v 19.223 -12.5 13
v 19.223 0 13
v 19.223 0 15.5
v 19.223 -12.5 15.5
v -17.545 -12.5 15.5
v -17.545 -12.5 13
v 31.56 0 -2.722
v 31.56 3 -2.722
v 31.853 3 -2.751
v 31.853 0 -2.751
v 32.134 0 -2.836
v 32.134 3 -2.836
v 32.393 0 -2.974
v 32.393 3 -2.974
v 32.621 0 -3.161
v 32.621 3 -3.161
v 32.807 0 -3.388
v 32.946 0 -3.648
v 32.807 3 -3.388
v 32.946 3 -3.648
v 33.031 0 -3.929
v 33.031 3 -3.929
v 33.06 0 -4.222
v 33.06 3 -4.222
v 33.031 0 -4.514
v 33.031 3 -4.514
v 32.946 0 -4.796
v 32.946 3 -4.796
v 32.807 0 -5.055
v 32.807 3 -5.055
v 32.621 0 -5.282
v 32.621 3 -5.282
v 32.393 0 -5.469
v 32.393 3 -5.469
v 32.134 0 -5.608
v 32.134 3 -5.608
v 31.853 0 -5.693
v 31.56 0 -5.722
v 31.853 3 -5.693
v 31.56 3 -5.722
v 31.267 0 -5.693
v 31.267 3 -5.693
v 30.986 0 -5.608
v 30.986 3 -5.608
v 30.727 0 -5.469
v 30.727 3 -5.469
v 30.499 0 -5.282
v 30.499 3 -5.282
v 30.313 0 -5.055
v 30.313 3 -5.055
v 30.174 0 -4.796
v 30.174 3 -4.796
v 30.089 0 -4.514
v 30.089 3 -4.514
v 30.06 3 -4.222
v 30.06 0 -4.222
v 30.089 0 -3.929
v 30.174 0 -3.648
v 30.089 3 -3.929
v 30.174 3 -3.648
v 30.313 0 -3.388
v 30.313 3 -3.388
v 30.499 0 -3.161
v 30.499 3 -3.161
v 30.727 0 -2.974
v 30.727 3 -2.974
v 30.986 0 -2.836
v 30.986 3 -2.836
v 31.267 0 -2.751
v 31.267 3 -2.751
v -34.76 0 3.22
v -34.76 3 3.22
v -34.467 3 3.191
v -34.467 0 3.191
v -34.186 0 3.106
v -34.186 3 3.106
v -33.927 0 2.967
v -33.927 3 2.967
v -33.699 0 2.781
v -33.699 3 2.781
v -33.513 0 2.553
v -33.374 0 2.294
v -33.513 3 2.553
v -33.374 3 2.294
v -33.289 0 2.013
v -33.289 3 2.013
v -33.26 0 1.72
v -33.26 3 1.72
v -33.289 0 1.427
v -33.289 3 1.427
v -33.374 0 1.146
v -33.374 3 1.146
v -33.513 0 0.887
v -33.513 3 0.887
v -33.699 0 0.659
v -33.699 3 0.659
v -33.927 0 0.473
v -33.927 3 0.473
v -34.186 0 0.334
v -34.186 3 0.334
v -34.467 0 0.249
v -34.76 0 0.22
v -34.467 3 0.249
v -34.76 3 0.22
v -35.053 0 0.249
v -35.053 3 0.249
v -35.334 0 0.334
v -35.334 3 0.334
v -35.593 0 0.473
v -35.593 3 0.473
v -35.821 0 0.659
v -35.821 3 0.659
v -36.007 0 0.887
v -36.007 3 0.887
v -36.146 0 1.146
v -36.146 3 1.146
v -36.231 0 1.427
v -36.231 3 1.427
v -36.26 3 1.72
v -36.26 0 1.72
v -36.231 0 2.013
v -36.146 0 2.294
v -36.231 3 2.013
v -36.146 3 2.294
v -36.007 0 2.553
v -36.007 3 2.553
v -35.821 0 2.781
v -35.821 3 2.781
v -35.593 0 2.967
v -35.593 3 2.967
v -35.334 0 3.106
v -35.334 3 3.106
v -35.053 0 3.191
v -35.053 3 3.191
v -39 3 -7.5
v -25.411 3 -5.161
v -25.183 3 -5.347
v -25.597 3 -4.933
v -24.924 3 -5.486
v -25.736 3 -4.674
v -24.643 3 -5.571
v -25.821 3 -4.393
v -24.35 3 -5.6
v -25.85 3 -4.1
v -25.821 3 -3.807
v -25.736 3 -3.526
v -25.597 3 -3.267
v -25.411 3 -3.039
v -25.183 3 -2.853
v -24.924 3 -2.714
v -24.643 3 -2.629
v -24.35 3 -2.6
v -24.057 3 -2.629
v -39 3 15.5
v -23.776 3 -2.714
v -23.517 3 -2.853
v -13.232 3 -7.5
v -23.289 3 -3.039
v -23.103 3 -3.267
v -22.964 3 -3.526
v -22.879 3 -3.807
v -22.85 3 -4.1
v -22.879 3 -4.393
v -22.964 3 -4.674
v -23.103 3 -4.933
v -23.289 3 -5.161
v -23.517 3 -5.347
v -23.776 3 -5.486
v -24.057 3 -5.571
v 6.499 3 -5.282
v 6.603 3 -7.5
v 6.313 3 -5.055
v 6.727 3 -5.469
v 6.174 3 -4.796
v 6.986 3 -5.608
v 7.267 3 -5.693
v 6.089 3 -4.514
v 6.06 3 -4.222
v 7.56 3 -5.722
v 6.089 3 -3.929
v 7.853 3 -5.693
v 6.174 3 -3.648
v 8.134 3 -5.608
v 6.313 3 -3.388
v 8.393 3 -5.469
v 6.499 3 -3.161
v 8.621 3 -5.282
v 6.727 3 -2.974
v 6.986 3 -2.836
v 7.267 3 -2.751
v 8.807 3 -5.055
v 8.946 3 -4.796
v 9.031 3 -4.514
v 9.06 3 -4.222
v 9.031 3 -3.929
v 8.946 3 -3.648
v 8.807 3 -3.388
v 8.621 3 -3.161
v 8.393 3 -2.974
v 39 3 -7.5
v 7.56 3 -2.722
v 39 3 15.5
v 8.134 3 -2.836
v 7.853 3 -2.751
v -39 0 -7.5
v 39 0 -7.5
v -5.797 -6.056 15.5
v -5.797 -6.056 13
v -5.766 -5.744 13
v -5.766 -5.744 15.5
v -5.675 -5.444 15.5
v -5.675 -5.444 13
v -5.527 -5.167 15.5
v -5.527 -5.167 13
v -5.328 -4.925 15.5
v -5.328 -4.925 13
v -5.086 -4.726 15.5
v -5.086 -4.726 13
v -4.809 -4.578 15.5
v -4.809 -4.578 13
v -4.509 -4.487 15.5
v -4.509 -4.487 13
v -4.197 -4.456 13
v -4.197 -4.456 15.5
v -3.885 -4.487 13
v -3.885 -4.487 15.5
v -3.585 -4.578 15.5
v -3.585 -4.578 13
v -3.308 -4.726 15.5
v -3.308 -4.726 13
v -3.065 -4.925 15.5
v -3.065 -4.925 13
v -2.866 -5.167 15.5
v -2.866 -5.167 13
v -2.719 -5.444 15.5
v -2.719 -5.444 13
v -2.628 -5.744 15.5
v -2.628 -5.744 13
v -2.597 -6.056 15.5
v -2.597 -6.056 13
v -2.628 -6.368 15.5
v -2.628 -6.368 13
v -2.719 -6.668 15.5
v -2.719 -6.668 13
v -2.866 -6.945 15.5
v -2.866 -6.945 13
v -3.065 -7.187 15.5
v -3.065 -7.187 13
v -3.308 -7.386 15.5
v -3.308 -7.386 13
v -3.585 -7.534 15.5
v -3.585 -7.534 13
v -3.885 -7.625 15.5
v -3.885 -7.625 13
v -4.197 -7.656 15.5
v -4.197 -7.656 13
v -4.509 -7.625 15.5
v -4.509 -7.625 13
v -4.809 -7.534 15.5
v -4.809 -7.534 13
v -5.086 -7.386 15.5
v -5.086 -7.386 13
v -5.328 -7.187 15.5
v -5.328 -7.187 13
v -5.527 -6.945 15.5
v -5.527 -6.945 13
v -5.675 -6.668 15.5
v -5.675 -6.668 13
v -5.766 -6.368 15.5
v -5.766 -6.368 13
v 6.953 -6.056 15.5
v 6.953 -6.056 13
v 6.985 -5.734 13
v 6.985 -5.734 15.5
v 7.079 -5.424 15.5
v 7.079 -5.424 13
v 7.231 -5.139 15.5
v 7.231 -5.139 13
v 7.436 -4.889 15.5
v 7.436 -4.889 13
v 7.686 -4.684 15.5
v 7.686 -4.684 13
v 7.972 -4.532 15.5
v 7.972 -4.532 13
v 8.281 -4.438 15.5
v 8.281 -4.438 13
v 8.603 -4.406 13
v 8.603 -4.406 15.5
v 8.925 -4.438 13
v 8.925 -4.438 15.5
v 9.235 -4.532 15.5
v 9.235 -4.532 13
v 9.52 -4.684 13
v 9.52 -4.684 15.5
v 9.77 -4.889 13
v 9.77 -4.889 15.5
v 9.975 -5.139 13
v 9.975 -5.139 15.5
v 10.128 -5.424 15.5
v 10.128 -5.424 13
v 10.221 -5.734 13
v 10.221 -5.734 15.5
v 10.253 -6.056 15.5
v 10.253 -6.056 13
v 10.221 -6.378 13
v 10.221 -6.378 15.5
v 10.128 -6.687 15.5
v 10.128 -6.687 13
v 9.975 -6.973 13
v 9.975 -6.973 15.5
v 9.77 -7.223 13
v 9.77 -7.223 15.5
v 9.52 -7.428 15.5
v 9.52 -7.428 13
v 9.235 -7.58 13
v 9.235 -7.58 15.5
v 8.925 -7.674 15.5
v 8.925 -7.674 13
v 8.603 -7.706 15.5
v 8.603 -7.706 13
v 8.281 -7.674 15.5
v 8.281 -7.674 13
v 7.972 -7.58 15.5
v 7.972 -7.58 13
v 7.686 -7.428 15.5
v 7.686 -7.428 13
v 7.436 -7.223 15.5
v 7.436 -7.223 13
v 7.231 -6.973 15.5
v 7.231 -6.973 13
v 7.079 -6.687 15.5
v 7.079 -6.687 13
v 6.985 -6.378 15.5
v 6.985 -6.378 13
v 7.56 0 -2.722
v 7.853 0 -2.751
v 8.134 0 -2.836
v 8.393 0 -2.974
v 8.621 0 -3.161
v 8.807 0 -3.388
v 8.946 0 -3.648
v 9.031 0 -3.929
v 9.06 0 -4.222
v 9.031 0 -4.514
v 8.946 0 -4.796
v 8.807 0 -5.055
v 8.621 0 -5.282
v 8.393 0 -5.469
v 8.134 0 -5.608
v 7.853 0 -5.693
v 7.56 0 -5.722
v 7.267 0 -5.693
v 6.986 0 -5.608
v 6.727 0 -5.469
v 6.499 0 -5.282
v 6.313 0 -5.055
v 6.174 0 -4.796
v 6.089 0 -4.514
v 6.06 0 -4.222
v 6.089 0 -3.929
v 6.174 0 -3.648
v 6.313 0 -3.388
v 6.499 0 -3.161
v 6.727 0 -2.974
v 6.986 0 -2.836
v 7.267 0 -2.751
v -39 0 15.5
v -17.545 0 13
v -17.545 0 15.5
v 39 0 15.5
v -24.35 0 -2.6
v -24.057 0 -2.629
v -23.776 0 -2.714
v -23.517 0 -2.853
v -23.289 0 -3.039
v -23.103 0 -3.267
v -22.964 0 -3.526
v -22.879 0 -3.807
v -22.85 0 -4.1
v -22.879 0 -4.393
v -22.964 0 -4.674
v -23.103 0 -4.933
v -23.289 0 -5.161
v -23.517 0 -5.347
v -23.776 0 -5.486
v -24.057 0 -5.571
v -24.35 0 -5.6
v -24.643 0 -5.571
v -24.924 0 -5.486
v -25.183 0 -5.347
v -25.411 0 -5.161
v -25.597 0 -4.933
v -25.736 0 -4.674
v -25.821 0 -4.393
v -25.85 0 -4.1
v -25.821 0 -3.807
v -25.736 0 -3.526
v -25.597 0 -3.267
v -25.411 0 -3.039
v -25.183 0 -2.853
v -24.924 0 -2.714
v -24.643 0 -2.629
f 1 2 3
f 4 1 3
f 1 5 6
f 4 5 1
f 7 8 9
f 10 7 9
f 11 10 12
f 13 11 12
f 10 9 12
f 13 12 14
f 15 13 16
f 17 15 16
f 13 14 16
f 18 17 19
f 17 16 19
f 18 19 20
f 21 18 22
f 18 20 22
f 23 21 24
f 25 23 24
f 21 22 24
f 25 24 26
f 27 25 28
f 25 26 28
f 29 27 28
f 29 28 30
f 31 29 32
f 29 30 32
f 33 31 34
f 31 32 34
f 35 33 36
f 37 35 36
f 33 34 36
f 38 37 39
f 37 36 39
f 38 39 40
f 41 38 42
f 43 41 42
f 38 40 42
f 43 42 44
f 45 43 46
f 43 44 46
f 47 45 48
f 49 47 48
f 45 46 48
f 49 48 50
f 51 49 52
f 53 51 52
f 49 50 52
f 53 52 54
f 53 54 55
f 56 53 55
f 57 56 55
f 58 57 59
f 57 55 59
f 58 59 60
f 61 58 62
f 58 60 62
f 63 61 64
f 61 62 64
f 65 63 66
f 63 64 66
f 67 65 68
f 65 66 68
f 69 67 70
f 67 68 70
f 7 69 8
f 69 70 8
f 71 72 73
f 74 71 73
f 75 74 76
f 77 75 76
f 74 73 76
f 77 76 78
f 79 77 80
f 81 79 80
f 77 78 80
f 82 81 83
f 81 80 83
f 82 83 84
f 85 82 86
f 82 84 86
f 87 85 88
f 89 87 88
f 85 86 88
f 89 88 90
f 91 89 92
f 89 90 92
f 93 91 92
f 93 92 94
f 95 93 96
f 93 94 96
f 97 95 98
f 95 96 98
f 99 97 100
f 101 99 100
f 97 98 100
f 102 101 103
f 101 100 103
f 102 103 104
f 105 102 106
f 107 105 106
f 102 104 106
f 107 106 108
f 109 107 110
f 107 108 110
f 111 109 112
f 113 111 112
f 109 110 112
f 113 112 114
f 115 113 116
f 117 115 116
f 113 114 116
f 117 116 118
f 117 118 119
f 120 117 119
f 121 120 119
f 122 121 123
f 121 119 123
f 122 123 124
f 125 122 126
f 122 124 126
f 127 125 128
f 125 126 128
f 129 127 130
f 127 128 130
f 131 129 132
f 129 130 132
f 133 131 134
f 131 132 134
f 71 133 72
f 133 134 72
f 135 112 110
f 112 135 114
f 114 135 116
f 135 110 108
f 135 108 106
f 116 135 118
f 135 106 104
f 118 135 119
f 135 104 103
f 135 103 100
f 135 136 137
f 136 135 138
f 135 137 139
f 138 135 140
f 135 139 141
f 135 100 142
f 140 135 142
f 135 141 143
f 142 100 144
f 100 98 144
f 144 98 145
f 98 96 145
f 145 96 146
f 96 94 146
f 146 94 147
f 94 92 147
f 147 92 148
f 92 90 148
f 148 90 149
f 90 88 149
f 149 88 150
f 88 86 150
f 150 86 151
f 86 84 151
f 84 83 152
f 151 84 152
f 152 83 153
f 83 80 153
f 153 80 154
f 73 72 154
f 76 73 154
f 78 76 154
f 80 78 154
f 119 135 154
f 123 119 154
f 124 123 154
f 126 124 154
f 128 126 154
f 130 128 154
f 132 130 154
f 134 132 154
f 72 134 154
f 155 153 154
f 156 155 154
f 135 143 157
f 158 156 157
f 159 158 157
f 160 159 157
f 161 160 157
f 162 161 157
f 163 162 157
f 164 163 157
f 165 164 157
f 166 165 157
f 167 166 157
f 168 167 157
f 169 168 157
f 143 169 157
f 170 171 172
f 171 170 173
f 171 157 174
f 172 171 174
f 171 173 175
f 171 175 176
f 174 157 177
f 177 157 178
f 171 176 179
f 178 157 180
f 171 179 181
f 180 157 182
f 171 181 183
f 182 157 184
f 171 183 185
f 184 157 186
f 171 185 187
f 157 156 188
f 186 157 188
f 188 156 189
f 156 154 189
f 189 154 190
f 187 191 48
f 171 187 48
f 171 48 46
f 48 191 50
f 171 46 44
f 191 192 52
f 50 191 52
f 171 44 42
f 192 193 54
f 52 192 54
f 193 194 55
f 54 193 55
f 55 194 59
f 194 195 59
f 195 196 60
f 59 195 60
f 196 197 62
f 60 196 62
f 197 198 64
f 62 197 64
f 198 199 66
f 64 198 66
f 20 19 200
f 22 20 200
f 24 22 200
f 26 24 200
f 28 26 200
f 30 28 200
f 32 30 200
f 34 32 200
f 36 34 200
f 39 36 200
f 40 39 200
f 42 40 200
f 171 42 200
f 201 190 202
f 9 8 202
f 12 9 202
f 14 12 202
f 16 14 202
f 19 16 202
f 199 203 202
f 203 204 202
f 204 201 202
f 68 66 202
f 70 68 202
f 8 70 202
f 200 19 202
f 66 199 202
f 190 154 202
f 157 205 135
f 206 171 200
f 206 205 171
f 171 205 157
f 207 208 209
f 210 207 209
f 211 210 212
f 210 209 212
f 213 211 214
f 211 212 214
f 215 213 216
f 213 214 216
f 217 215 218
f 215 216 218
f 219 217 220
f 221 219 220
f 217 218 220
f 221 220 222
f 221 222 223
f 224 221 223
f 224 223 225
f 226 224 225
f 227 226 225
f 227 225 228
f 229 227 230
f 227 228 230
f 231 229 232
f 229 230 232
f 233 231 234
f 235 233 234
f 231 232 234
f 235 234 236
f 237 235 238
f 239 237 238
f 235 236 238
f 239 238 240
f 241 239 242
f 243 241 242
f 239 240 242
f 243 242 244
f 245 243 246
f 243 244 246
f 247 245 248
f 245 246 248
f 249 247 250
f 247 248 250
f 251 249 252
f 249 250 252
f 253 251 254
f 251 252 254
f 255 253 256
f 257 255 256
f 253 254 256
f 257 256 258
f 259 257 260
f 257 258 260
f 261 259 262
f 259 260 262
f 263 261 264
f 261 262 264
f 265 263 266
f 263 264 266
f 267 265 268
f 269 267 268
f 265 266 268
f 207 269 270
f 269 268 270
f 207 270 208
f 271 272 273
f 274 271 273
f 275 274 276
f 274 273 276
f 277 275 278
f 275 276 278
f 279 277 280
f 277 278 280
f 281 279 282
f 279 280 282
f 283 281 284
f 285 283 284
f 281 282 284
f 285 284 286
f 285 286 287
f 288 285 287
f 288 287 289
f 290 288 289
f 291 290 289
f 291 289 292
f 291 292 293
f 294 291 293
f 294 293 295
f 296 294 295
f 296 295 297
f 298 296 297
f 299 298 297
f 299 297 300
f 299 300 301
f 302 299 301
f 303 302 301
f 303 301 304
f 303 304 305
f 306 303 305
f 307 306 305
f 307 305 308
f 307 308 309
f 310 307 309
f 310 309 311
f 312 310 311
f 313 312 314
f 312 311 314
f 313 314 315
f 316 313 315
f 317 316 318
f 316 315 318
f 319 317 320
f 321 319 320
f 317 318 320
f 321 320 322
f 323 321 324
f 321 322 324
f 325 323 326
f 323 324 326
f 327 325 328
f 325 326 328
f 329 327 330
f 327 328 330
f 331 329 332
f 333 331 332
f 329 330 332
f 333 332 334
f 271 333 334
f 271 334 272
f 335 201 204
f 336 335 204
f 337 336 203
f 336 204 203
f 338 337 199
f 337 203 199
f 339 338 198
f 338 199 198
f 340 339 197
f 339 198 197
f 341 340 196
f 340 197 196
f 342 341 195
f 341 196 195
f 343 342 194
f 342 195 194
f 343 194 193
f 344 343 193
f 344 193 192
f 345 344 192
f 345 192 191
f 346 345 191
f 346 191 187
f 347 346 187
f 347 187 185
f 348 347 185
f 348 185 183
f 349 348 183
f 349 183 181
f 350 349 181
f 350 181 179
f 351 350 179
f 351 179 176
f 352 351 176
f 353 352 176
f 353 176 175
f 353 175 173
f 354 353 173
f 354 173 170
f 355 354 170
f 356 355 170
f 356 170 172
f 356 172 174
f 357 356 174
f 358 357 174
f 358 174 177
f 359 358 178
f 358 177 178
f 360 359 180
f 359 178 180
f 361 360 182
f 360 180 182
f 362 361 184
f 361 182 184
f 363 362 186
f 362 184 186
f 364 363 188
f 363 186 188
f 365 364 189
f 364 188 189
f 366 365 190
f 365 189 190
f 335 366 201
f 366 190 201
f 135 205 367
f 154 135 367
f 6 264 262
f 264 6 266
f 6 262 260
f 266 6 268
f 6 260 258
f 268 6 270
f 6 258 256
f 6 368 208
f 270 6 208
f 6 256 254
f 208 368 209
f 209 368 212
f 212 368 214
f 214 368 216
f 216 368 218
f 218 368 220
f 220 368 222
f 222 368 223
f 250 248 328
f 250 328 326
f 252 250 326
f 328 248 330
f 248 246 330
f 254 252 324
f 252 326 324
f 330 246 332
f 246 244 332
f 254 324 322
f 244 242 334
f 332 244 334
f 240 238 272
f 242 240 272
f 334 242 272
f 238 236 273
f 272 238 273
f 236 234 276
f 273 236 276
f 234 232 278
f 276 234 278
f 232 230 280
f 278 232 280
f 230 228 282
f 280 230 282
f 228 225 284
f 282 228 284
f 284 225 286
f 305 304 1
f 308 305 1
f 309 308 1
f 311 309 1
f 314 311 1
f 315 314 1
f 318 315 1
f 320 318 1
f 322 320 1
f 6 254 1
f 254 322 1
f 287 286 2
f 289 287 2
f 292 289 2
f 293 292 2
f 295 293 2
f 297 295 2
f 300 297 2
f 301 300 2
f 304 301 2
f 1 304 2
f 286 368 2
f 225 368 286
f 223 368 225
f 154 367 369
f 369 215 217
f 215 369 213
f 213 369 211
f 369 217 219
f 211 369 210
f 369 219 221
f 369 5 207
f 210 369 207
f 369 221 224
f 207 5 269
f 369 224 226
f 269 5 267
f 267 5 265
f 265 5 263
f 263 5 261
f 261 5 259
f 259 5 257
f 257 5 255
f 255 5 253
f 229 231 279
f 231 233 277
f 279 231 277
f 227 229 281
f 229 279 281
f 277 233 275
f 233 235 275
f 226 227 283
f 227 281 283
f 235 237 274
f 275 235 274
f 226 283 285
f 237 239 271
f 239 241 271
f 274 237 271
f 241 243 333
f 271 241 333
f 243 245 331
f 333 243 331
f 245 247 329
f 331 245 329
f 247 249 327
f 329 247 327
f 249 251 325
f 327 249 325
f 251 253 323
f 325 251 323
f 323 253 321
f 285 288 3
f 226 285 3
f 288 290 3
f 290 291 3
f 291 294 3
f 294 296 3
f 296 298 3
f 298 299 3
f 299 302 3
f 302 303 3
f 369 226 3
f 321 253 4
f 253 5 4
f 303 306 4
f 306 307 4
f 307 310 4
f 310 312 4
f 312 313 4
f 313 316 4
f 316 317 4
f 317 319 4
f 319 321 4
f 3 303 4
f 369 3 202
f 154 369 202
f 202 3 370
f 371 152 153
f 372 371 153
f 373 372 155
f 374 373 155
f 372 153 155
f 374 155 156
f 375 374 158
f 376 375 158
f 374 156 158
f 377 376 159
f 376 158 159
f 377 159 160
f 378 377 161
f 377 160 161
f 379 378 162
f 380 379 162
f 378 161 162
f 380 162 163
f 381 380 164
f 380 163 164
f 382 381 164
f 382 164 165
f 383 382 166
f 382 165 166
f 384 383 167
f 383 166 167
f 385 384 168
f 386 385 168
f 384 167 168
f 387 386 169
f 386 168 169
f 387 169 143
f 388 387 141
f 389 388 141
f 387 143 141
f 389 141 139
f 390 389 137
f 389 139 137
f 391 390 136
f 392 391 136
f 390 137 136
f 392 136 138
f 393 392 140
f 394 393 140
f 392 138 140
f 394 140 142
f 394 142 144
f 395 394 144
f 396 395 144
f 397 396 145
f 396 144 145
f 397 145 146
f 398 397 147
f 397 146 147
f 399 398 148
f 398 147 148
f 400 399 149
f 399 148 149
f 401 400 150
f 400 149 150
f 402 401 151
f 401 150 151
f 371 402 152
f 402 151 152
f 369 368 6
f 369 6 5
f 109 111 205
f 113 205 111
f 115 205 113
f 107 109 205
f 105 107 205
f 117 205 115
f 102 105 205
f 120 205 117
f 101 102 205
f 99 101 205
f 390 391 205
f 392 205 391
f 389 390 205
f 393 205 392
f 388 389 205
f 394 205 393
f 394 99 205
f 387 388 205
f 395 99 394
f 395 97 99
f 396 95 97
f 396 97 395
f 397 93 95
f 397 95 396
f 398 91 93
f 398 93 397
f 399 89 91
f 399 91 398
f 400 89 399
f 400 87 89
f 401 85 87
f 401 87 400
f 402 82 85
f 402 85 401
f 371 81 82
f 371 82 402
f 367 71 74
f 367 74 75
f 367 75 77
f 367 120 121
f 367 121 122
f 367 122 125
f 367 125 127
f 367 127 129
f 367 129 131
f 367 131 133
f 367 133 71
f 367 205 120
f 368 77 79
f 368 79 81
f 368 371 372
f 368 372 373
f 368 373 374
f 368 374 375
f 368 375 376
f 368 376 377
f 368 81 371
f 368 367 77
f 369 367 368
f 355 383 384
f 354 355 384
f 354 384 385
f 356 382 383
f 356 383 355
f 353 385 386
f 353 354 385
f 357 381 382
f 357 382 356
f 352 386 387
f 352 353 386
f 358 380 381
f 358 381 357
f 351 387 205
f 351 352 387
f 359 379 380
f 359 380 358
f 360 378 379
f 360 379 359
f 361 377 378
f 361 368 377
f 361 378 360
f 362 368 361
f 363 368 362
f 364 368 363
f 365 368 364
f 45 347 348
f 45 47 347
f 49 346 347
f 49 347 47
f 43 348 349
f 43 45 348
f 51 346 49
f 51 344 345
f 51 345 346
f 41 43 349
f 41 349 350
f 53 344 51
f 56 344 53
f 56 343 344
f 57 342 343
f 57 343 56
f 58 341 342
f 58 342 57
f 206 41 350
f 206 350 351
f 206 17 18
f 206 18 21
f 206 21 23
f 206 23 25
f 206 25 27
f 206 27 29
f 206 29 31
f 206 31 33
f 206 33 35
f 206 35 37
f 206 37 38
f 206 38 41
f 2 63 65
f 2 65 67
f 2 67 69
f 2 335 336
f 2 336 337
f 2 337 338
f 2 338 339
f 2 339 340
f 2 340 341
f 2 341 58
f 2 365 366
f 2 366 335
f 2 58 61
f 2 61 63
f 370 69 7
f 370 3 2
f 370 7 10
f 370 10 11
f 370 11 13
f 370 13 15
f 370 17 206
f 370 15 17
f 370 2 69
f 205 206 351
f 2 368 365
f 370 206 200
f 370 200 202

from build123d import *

# Parameters (mm, degrees)
SKETCH_1_W                = 78
SKETCH_1_H                = 15
EXTRUDE_1_DEPTH           = 3
SKETCH_3_R                = 1.5
CUT_EXTRUDE_1_DEPTH       = 3
SKETCH_4_R                = 6
EXTRUDE_2_DEPTH           = 18
SKETCH_5_R                = 4.5
CUT_EXTRUDE_2_DEPTH       = 21
F_2_0MM_2_D               = 3
F_2_0MM_2_DEPTH           = 4.5
F_2_0MM_2_TIP             = 1.5
F_2_0MM_2_ON_FACE_2_D     = 3
F_2_0MM_2_ON_FACE_2_DEPTH = 4.5
F_2_0MM_2_ON_FACE_2_TIP   = 1.5
SKETCH_10_W               = 6
SKETCH_10_H               = 10
CUT_EXTRUDE_3_DEPTH       = 7
SKETCH_13_W               = 19.835687411
SKETCH_13_H               = 21.610205193
CUT_EXTRUDE_4_DEPTH       = 20
SKETCH_14_W               = 11.523038103
SKETCH_14_H               = 10.49031299
EXTRUDE_3_DEPTH           = 3
SKETCH_18_W               = 78
SKETCH_18_H               = 8
EXTRUDE_4_DEPTH           = 3
SKETCH_19_W               = 36.767904102
SKETCH_19_H               = 2.5
EXTRUDE_5_DEPTH           = 12.5
SKETCH_23_R               = 1.65
CUT_EXTRUDE_6_DEPTH       = 12.5
SKETCH_25_W               = 4.236607592
SKETCH_25_H               = 5.36409187
EXTRUDE_7_DEPTH           = 2.5
SKETCH_26_R               = 1.6
CUT_EXTRUDE_7_DEPTH       = 2.5


with BuildPart() as part:
    # 草图1 → 凸台-拉伸1 (new body)
    with BuildSketch(Plane(origin=(0, 0, 0), x_dir=(1, 0, 0), z_dir=(0, 1, 0))):
        Rectangle(SKETCH_1_W, SKETCH_1_H)
    extrude(amount=EXTRUDE_1_DEPTH)

    # 草图3 → 切除-拉伸1 (cut)
    with BuildSketch(Plane(origin=(0, 3, 0), x_dir=(1, 0, 0), z_dir=(0, 1, 0))):
        with Locations(Location((-34.76, -1.72, 0), (0, 0, 270))):
            Circle(SKETCH_3_R)
        with Locations(Location((-24.35, 4.1, 0), (0, 0, 270))):
            Circle(SKETCH_3_R)
        with Locations(Location((31.56, 4.221692081, 0), (0, 0, 270))):
            Circle(SKETCH_3_R)
        with Locations(Location((7.56, 4.221692081, 0), (0, 0, 270))):
            Circle(SKETCH_3_R)
    extrude(amount=-CUT_EXTRUDE_1_DEPTH, mode=Mode.SUBTRACT)

    # 草图4 → 凸台-拉伸2 (add)
    with BuildSketch(Plane(origin=(0, 3, 0), x_dir=(1, 0, 0), z_dir=(0, 1, 0))):
        with Locations(Location((-3, -1.234165229, 0), (0, 0, 270))):
            Circle(SKETCH_4_R)
    extrude(amount=EXTRUDE_2_DEPTH)

    # 草图5 → 切除-拉伸2 (cut)
    with BuildSketch(Plane(origin=(0, 21, 0), x_dir=(1, 0, 0), z_dir=(0, 1, 0))):
        with Locations(Location((-3, -1.234165229, 0), (0, 0, 270))):
            Circle(SKETCH_5_R)
    extrude(amount=-CUT_EXTRUDE_2_DEPTH, mode=Mode.SUBTRACT)

    # Ø2.0mm 暗销孔2
    with Locations(Plane(origin=(-7.901331048, 17.342107422, 4.694938836), x_dir=(-0.576795601176, 0, -0.816888507977), z_dir=(-0.816888507977, 0, 0.576795601176))):
        with Locations((0, 0)):
            Hole(F_2_0MM_2_D / 2, depth=F_2_0MM_2_DEPTH)
            with Locations((0, 0, -(F_2_0MM_2_DEPTH + F_2_0MM_2_TIP / 2))):  # 90° drill point
                Cone(0, F_2_0MM_2_D / 2, F_2_0MM_2_TIP, mode=Mode.SUBTRACT)

    # Ø2.0mm 暗销孔2 on face 2
    with Locations(Plane(origin=(1.071764877, 17.164817099, 5.641061052), x_dir=(0.734483043181, 0, -0.678627039897), z_dir=(0.678627039897, 0, 0.734483043181))):
        with Locations((0, 0)):
            Hole(F_2_0MM_2_ON_FACE_2_D / 2, depth=F_2_0MM_2_ON_FACE_2_DEPTH)
            with Locations((0, 0, -(F_2_0MM_2_ON_FACE_2_DEPTH + F_2_0MM_2_ON_FACE_2_TIP / 2))):  # 90° drill point
                Cone(0, F_2_0MM_2_ON_FACE_2_D / 2, F_2_0MM_2_ON_FACE_2_TIP, mode=Mode.SUBTRACT)

    # 草图10 → 切除-拉伸3 (cut)
    with BuildSketch(Plane(origin=(0, 0, -7.5), x_dir=(-1, 0, 0), z_dir=(0, 0, -1))):
        with Locations((3, 8)):
            Rectangle(SKETCH_10_W, SKETCH_10_H)
    extrude(amount=-CUT_EXTRUDE_3_DEPTH, mode=Mode.SUBTRACT)

    # 草图13 → 切除-拉伸4 (cut)
    with BuildSketch(Plane(origin=(0, 0, -7.5), x_dir=(-1, 0, 0), z_dir=(0, 0, -1))):
        with Locations((3.314421038, 13.805102597)):
            Rectangle(SKETCH_13_W, SKETCH_13_H)
    extrude(amount=-CUT_EXTRUDE_4_DEPTH, mode=Mode.SUBTRACT)

    # 草图14 → 凸台-拉伸3 (add)
    with BuildSketch(Plane(origin=(0, 3, 0), x_dir=(1, 0, 0), z_dir=(0, 1, 0))):
        with Locations((-2.989467433, -1.263493391)):
            Rectangle(SKETCH_14_W, SKETCH_14_H)
    extrude(amount=-EXTRUDE_3_DEPTH)

    # 草图18 → 凸台-拉伸4 (add)
    with BuildSketch(Plane.XZ):
        with Locations((0, 11.5)):
            Rectangle(SKETCH_18_W, SKETCH_18_H)
    extrude(amount=-EXTRUDE_4_DEPTH)

    # 草图19 → 凸台-拉伸5 (add)
    with BuildSketch(Plane.XZ):
        with Locations((0.839237194, 14.25)):
            Rectangle(SKETCH_19_W, SKETCH_19_H)
    extrude(amount=EXTRUDE_5_DEPTH)

    # 草图23 → 切除-拉伸6 (cut)
    with BuildSketch(Plane(origin=(0, 0, 13), x_dir=(-1, 0, 0), z_dir=(0, 0, -1))):
        with Locations((-8.603189245, -6.05592298)):
            Circle(SKETCH_23_R)
        with Locations((2.596810755, -6.05592298)):
            Circle(SKETCH_23_R)
    extrude(amount=-CUT_EXTRUDE_6_DEPTH, mode=Mode.SUBTRACT)

    # 草图25 → 凸台-拉伸7 (add)
    with BuildSketch(Plane(origin=(0, 0, 13), x_dir=(-1, 0, 0), z_dir=(0, 0, -1))):
        with Locations((2.330668631, -6.426480946)):
            Rectangle(SKETCH_25_W, SKETCH_25_H)
    extrude(amount=-EXTRUDE_7_DEPTH)

    # 草图26 → 切除-拉伸7 (cut)
    with BuildSketch(Plane(origin=(0, 0, 13), x_dir=(-1, 0, 0), z_dir=(0, 0, -1))):
        with Locations((4.196810755, -6.05592298)):
            Circle(SKETCH_26_R)
    extrude(amount=-CUT_EXTRUDE_7_DEPTH, mode=Mode.SUBTRACT)


solid = part.part
